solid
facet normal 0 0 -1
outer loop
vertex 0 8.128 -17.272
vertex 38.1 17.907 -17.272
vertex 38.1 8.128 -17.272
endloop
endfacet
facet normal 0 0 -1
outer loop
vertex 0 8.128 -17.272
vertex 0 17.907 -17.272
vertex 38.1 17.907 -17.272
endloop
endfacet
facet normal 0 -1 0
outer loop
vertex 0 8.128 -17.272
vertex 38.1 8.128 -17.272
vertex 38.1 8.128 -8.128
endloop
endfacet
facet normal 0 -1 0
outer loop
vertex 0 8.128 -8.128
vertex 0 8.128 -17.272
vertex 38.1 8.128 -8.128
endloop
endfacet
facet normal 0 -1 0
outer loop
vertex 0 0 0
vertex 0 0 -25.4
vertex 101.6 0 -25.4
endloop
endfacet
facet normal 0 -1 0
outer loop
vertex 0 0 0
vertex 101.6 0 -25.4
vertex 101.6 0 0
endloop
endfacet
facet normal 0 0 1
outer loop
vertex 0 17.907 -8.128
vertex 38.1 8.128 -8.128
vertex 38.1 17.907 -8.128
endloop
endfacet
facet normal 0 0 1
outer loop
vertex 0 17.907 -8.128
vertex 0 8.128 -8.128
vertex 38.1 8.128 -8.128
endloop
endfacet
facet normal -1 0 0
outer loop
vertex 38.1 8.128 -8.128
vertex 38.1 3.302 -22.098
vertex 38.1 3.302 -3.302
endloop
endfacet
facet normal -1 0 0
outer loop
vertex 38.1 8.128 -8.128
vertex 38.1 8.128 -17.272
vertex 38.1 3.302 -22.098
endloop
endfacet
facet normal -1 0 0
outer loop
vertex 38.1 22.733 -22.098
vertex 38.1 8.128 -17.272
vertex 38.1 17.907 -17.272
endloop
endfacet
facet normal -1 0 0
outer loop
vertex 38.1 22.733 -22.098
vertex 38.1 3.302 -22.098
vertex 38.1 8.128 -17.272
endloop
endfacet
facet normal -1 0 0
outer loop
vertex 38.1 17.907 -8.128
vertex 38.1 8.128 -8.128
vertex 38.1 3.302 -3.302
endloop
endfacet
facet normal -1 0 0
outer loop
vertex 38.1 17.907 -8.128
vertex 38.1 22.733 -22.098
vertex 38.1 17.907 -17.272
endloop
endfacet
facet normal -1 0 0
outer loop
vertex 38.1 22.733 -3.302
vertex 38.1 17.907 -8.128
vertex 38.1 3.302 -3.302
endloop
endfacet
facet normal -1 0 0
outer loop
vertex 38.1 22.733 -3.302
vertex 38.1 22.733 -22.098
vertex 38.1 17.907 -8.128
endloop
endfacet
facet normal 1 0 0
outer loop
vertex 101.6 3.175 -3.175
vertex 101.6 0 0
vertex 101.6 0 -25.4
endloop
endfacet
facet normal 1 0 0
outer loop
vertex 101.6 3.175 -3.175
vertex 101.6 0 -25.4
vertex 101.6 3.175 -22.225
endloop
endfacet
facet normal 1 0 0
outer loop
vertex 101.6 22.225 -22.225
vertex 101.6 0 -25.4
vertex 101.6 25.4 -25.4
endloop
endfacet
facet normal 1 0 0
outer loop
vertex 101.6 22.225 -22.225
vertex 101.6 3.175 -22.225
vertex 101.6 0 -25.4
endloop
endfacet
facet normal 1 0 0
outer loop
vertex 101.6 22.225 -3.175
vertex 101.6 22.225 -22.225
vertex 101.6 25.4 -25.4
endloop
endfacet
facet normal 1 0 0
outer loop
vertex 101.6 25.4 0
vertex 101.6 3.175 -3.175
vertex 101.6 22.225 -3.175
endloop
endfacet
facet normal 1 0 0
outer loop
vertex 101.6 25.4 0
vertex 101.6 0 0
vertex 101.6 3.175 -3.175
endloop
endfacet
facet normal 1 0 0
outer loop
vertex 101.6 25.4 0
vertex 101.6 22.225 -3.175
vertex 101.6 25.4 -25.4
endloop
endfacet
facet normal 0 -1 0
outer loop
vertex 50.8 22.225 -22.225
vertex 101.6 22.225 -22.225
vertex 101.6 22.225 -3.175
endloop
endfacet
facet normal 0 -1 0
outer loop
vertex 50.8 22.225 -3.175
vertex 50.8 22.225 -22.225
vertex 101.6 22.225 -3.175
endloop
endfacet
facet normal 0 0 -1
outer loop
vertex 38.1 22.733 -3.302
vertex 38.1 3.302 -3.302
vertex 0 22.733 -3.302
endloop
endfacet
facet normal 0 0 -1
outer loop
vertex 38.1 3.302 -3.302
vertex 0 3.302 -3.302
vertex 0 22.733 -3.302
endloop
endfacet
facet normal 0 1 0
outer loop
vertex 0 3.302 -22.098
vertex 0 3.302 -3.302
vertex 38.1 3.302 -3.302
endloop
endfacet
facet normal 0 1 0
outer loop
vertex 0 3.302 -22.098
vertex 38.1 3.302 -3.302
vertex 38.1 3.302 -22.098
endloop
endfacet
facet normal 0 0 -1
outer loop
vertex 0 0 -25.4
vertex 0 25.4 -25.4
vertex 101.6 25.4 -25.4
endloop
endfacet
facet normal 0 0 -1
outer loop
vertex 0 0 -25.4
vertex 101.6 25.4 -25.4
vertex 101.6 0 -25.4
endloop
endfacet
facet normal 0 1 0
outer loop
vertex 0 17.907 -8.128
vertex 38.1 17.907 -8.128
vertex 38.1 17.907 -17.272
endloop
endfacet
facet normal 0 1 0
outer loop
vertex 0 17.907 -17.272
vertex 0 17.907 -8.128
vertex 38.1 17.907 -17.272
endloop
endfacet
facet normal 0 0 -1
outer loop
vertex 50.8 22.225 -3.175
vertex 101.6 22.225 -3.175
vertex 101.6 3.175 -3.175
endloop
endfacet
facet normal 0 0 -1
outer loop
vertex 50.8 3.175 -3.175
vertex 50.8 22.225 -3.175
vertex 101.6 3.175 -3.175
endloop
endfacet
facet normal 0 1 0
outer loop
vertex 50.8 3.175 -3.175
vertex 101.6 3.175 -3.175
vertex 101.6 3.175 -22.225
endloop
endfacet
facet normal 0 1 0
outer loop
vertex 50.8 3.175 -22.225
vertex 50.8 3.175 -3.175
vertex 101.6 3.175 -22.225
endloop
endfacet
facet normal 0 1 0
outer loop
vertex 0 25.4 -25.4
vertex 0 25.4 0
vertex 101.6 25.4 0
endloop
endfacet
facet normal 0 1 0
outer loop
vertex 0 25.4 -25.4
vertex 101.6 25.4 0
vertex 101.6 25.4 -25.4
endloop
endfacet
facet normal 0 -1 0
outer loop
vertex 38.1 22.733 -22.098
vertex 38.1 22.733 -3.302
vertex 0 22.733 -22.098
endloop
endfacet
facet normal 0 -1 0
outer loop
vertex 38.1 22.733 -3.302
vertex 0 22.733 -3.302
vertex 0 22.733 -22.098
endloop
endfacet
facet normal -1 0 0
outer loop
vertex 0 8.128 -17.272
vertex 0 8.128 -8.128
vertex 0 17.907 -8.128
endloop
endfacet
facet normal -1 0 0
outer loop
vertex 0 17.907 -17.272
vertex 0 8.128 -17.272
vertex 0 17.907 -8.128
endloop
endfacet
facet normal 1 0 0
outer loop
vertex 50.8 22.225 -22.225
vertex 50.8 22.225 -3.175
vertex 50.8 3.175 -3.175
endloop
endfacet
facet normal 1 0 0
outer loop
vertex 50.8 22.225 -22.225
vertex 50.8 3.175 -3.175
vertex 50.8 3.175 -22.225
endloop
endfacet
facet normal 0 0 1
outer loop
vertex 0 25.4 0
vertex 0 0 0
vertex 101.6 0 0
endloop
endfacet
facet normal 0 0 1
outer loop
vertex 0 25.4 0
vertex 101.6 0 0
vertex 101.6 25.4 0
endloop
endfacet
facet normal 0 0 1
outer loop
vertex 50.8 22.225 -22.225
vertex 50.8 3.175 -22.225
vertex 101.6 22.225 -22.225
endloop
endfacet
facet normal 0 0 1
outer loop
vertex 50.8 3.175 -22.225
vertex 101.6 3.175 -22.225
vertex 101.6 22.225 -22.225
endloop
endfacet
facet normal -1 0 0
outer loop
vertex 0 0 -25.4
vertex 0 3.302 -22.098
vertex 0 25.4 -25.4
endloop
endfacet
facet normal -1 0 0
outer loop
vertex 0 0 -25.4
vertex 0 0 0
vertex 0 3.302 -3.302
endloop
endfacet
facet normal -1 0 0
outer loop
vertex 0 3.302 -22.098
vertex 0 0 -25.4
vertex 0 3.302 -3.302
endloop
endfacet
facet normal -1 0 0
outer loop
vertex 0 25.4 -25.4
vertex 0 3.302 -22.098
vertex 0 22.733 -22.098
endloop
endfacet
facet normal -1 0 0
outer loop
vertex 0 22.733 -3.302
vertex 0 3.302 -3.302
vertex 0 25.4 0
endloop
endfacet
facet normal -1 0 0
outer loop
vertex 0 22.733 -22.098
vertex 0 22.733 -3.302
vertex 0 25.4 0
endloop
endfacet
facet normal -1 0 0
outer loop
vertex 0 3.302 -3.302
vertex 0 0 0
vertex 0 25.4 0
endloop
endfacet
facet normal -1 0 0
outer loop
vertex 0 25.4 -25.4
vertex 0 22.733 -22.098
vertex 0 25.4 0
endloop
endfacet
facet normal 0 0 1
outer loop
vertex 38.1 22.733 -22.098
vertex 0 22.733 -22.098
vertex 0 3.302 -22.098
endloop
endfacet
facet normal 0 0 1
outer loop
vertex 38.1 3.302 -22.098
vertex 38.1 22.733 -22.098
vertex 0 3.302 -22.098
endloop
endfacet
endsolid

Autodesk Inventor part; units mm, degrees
ref_plane "YZ Plane" through (0, 0, 0) normal (1, 0, 0) x (0, 1, 0)
ref_plane "XZ Plane" through (0, 0, 0) normal (0, 1, 0) x (-1, 0, 0)
ref_plane "XY Plane" through (0, 0, 0) normal (0, 0, 1) x (1, 0, 0)
sketch "Sketch1" plane through (0, 0, 0) normal (1, 0, 0) x (0, 1, 0)
  point P0 (0, 0)
sketch "Sketch2" plane through (0, 0, 0) normal (1, 0, 0) x (0, 1, 0)
  line L0 (0, 0) -> (25.4, 0)
  line L1 (25.4, 0) -> (25.4, -25.4)
  line L2 (25.4, -25.4) -> (0, -25.4)
  line L3 (0, -25.4) -> (0, 0)
  dimension "d0" = 25.4
  dimension "d1" = 25.4
extrude "Extrusion1" add sketch "Sketch2" along normal blind 101.6
sketch "Sketch3" plane through (101.6, 0, 0) normal (1, 0, 0) x (0, 0, -1)
  line L0 (0, 0) -> (25.4, 0) projected
  line L1 (0, 0) -> (3.175, 0)
  line L2 (3.175, 0) -> (0, 0)
  line L3 (3.175, 0) -> (3.175, 3.175)
  line L4 (3.175, 3.175) -> (22.225, 3.175)
  line L5 (22.225, 3.175) -> (22.225, 22.225)
  line L6 (22.225, 22.225) -> (3.175, 22.225)
  line L7 (3.175, 22.225) -> (3.175, 3.175)
  dimension "d7" = 19.05
  dimension "d8" = 19.05
extrude "Extrusion2" cut sketch "Sketch3" against normal blind 50.8
sketch "Sketch4" plane through (0, 0, 0) normal (-1, 0, 0) x (0, 0, 1)
  line L0 (-25.4, 0) -> (-25.4, 25.4) projected
  line L1 (-25.4, 25.4) -> (0, 25.4) projected
  line L2 (-22.225, 3.175) -> (-3.175, 3.175) projected
  line L3 (-22.225, 22.225) -> (-22.225, 3.175) projected
  line L4 (-21.59, 3.302) -> (-22.098, 3.302)
  line L5 (-17.272, 8.128) -> (-8.128, 8.128)
  line L6 (-8.128, 8.128) -> (-8.128, 17.907)
  line L7 (-8.128, 17.907) -> (-17.272, 17.907)
  line L8 (-17.272, 17.907) -> (-17.272, 8.128)
  line L9 (-22.098, 3.302) -> (-3.302, 3.302)
  line L10 (-3.302, 3.302) -> (-3.302, 22.733)
  line L11 (-3.302, 22.733) -> (-22.098, 22.733)
  line L12 (-22.098, 22.733) -> (-22.098, 3.302)
extrude "Extrusion3" cut sketch "Sketch4" against normal blind 38.1
properties part number "Side Piece"
